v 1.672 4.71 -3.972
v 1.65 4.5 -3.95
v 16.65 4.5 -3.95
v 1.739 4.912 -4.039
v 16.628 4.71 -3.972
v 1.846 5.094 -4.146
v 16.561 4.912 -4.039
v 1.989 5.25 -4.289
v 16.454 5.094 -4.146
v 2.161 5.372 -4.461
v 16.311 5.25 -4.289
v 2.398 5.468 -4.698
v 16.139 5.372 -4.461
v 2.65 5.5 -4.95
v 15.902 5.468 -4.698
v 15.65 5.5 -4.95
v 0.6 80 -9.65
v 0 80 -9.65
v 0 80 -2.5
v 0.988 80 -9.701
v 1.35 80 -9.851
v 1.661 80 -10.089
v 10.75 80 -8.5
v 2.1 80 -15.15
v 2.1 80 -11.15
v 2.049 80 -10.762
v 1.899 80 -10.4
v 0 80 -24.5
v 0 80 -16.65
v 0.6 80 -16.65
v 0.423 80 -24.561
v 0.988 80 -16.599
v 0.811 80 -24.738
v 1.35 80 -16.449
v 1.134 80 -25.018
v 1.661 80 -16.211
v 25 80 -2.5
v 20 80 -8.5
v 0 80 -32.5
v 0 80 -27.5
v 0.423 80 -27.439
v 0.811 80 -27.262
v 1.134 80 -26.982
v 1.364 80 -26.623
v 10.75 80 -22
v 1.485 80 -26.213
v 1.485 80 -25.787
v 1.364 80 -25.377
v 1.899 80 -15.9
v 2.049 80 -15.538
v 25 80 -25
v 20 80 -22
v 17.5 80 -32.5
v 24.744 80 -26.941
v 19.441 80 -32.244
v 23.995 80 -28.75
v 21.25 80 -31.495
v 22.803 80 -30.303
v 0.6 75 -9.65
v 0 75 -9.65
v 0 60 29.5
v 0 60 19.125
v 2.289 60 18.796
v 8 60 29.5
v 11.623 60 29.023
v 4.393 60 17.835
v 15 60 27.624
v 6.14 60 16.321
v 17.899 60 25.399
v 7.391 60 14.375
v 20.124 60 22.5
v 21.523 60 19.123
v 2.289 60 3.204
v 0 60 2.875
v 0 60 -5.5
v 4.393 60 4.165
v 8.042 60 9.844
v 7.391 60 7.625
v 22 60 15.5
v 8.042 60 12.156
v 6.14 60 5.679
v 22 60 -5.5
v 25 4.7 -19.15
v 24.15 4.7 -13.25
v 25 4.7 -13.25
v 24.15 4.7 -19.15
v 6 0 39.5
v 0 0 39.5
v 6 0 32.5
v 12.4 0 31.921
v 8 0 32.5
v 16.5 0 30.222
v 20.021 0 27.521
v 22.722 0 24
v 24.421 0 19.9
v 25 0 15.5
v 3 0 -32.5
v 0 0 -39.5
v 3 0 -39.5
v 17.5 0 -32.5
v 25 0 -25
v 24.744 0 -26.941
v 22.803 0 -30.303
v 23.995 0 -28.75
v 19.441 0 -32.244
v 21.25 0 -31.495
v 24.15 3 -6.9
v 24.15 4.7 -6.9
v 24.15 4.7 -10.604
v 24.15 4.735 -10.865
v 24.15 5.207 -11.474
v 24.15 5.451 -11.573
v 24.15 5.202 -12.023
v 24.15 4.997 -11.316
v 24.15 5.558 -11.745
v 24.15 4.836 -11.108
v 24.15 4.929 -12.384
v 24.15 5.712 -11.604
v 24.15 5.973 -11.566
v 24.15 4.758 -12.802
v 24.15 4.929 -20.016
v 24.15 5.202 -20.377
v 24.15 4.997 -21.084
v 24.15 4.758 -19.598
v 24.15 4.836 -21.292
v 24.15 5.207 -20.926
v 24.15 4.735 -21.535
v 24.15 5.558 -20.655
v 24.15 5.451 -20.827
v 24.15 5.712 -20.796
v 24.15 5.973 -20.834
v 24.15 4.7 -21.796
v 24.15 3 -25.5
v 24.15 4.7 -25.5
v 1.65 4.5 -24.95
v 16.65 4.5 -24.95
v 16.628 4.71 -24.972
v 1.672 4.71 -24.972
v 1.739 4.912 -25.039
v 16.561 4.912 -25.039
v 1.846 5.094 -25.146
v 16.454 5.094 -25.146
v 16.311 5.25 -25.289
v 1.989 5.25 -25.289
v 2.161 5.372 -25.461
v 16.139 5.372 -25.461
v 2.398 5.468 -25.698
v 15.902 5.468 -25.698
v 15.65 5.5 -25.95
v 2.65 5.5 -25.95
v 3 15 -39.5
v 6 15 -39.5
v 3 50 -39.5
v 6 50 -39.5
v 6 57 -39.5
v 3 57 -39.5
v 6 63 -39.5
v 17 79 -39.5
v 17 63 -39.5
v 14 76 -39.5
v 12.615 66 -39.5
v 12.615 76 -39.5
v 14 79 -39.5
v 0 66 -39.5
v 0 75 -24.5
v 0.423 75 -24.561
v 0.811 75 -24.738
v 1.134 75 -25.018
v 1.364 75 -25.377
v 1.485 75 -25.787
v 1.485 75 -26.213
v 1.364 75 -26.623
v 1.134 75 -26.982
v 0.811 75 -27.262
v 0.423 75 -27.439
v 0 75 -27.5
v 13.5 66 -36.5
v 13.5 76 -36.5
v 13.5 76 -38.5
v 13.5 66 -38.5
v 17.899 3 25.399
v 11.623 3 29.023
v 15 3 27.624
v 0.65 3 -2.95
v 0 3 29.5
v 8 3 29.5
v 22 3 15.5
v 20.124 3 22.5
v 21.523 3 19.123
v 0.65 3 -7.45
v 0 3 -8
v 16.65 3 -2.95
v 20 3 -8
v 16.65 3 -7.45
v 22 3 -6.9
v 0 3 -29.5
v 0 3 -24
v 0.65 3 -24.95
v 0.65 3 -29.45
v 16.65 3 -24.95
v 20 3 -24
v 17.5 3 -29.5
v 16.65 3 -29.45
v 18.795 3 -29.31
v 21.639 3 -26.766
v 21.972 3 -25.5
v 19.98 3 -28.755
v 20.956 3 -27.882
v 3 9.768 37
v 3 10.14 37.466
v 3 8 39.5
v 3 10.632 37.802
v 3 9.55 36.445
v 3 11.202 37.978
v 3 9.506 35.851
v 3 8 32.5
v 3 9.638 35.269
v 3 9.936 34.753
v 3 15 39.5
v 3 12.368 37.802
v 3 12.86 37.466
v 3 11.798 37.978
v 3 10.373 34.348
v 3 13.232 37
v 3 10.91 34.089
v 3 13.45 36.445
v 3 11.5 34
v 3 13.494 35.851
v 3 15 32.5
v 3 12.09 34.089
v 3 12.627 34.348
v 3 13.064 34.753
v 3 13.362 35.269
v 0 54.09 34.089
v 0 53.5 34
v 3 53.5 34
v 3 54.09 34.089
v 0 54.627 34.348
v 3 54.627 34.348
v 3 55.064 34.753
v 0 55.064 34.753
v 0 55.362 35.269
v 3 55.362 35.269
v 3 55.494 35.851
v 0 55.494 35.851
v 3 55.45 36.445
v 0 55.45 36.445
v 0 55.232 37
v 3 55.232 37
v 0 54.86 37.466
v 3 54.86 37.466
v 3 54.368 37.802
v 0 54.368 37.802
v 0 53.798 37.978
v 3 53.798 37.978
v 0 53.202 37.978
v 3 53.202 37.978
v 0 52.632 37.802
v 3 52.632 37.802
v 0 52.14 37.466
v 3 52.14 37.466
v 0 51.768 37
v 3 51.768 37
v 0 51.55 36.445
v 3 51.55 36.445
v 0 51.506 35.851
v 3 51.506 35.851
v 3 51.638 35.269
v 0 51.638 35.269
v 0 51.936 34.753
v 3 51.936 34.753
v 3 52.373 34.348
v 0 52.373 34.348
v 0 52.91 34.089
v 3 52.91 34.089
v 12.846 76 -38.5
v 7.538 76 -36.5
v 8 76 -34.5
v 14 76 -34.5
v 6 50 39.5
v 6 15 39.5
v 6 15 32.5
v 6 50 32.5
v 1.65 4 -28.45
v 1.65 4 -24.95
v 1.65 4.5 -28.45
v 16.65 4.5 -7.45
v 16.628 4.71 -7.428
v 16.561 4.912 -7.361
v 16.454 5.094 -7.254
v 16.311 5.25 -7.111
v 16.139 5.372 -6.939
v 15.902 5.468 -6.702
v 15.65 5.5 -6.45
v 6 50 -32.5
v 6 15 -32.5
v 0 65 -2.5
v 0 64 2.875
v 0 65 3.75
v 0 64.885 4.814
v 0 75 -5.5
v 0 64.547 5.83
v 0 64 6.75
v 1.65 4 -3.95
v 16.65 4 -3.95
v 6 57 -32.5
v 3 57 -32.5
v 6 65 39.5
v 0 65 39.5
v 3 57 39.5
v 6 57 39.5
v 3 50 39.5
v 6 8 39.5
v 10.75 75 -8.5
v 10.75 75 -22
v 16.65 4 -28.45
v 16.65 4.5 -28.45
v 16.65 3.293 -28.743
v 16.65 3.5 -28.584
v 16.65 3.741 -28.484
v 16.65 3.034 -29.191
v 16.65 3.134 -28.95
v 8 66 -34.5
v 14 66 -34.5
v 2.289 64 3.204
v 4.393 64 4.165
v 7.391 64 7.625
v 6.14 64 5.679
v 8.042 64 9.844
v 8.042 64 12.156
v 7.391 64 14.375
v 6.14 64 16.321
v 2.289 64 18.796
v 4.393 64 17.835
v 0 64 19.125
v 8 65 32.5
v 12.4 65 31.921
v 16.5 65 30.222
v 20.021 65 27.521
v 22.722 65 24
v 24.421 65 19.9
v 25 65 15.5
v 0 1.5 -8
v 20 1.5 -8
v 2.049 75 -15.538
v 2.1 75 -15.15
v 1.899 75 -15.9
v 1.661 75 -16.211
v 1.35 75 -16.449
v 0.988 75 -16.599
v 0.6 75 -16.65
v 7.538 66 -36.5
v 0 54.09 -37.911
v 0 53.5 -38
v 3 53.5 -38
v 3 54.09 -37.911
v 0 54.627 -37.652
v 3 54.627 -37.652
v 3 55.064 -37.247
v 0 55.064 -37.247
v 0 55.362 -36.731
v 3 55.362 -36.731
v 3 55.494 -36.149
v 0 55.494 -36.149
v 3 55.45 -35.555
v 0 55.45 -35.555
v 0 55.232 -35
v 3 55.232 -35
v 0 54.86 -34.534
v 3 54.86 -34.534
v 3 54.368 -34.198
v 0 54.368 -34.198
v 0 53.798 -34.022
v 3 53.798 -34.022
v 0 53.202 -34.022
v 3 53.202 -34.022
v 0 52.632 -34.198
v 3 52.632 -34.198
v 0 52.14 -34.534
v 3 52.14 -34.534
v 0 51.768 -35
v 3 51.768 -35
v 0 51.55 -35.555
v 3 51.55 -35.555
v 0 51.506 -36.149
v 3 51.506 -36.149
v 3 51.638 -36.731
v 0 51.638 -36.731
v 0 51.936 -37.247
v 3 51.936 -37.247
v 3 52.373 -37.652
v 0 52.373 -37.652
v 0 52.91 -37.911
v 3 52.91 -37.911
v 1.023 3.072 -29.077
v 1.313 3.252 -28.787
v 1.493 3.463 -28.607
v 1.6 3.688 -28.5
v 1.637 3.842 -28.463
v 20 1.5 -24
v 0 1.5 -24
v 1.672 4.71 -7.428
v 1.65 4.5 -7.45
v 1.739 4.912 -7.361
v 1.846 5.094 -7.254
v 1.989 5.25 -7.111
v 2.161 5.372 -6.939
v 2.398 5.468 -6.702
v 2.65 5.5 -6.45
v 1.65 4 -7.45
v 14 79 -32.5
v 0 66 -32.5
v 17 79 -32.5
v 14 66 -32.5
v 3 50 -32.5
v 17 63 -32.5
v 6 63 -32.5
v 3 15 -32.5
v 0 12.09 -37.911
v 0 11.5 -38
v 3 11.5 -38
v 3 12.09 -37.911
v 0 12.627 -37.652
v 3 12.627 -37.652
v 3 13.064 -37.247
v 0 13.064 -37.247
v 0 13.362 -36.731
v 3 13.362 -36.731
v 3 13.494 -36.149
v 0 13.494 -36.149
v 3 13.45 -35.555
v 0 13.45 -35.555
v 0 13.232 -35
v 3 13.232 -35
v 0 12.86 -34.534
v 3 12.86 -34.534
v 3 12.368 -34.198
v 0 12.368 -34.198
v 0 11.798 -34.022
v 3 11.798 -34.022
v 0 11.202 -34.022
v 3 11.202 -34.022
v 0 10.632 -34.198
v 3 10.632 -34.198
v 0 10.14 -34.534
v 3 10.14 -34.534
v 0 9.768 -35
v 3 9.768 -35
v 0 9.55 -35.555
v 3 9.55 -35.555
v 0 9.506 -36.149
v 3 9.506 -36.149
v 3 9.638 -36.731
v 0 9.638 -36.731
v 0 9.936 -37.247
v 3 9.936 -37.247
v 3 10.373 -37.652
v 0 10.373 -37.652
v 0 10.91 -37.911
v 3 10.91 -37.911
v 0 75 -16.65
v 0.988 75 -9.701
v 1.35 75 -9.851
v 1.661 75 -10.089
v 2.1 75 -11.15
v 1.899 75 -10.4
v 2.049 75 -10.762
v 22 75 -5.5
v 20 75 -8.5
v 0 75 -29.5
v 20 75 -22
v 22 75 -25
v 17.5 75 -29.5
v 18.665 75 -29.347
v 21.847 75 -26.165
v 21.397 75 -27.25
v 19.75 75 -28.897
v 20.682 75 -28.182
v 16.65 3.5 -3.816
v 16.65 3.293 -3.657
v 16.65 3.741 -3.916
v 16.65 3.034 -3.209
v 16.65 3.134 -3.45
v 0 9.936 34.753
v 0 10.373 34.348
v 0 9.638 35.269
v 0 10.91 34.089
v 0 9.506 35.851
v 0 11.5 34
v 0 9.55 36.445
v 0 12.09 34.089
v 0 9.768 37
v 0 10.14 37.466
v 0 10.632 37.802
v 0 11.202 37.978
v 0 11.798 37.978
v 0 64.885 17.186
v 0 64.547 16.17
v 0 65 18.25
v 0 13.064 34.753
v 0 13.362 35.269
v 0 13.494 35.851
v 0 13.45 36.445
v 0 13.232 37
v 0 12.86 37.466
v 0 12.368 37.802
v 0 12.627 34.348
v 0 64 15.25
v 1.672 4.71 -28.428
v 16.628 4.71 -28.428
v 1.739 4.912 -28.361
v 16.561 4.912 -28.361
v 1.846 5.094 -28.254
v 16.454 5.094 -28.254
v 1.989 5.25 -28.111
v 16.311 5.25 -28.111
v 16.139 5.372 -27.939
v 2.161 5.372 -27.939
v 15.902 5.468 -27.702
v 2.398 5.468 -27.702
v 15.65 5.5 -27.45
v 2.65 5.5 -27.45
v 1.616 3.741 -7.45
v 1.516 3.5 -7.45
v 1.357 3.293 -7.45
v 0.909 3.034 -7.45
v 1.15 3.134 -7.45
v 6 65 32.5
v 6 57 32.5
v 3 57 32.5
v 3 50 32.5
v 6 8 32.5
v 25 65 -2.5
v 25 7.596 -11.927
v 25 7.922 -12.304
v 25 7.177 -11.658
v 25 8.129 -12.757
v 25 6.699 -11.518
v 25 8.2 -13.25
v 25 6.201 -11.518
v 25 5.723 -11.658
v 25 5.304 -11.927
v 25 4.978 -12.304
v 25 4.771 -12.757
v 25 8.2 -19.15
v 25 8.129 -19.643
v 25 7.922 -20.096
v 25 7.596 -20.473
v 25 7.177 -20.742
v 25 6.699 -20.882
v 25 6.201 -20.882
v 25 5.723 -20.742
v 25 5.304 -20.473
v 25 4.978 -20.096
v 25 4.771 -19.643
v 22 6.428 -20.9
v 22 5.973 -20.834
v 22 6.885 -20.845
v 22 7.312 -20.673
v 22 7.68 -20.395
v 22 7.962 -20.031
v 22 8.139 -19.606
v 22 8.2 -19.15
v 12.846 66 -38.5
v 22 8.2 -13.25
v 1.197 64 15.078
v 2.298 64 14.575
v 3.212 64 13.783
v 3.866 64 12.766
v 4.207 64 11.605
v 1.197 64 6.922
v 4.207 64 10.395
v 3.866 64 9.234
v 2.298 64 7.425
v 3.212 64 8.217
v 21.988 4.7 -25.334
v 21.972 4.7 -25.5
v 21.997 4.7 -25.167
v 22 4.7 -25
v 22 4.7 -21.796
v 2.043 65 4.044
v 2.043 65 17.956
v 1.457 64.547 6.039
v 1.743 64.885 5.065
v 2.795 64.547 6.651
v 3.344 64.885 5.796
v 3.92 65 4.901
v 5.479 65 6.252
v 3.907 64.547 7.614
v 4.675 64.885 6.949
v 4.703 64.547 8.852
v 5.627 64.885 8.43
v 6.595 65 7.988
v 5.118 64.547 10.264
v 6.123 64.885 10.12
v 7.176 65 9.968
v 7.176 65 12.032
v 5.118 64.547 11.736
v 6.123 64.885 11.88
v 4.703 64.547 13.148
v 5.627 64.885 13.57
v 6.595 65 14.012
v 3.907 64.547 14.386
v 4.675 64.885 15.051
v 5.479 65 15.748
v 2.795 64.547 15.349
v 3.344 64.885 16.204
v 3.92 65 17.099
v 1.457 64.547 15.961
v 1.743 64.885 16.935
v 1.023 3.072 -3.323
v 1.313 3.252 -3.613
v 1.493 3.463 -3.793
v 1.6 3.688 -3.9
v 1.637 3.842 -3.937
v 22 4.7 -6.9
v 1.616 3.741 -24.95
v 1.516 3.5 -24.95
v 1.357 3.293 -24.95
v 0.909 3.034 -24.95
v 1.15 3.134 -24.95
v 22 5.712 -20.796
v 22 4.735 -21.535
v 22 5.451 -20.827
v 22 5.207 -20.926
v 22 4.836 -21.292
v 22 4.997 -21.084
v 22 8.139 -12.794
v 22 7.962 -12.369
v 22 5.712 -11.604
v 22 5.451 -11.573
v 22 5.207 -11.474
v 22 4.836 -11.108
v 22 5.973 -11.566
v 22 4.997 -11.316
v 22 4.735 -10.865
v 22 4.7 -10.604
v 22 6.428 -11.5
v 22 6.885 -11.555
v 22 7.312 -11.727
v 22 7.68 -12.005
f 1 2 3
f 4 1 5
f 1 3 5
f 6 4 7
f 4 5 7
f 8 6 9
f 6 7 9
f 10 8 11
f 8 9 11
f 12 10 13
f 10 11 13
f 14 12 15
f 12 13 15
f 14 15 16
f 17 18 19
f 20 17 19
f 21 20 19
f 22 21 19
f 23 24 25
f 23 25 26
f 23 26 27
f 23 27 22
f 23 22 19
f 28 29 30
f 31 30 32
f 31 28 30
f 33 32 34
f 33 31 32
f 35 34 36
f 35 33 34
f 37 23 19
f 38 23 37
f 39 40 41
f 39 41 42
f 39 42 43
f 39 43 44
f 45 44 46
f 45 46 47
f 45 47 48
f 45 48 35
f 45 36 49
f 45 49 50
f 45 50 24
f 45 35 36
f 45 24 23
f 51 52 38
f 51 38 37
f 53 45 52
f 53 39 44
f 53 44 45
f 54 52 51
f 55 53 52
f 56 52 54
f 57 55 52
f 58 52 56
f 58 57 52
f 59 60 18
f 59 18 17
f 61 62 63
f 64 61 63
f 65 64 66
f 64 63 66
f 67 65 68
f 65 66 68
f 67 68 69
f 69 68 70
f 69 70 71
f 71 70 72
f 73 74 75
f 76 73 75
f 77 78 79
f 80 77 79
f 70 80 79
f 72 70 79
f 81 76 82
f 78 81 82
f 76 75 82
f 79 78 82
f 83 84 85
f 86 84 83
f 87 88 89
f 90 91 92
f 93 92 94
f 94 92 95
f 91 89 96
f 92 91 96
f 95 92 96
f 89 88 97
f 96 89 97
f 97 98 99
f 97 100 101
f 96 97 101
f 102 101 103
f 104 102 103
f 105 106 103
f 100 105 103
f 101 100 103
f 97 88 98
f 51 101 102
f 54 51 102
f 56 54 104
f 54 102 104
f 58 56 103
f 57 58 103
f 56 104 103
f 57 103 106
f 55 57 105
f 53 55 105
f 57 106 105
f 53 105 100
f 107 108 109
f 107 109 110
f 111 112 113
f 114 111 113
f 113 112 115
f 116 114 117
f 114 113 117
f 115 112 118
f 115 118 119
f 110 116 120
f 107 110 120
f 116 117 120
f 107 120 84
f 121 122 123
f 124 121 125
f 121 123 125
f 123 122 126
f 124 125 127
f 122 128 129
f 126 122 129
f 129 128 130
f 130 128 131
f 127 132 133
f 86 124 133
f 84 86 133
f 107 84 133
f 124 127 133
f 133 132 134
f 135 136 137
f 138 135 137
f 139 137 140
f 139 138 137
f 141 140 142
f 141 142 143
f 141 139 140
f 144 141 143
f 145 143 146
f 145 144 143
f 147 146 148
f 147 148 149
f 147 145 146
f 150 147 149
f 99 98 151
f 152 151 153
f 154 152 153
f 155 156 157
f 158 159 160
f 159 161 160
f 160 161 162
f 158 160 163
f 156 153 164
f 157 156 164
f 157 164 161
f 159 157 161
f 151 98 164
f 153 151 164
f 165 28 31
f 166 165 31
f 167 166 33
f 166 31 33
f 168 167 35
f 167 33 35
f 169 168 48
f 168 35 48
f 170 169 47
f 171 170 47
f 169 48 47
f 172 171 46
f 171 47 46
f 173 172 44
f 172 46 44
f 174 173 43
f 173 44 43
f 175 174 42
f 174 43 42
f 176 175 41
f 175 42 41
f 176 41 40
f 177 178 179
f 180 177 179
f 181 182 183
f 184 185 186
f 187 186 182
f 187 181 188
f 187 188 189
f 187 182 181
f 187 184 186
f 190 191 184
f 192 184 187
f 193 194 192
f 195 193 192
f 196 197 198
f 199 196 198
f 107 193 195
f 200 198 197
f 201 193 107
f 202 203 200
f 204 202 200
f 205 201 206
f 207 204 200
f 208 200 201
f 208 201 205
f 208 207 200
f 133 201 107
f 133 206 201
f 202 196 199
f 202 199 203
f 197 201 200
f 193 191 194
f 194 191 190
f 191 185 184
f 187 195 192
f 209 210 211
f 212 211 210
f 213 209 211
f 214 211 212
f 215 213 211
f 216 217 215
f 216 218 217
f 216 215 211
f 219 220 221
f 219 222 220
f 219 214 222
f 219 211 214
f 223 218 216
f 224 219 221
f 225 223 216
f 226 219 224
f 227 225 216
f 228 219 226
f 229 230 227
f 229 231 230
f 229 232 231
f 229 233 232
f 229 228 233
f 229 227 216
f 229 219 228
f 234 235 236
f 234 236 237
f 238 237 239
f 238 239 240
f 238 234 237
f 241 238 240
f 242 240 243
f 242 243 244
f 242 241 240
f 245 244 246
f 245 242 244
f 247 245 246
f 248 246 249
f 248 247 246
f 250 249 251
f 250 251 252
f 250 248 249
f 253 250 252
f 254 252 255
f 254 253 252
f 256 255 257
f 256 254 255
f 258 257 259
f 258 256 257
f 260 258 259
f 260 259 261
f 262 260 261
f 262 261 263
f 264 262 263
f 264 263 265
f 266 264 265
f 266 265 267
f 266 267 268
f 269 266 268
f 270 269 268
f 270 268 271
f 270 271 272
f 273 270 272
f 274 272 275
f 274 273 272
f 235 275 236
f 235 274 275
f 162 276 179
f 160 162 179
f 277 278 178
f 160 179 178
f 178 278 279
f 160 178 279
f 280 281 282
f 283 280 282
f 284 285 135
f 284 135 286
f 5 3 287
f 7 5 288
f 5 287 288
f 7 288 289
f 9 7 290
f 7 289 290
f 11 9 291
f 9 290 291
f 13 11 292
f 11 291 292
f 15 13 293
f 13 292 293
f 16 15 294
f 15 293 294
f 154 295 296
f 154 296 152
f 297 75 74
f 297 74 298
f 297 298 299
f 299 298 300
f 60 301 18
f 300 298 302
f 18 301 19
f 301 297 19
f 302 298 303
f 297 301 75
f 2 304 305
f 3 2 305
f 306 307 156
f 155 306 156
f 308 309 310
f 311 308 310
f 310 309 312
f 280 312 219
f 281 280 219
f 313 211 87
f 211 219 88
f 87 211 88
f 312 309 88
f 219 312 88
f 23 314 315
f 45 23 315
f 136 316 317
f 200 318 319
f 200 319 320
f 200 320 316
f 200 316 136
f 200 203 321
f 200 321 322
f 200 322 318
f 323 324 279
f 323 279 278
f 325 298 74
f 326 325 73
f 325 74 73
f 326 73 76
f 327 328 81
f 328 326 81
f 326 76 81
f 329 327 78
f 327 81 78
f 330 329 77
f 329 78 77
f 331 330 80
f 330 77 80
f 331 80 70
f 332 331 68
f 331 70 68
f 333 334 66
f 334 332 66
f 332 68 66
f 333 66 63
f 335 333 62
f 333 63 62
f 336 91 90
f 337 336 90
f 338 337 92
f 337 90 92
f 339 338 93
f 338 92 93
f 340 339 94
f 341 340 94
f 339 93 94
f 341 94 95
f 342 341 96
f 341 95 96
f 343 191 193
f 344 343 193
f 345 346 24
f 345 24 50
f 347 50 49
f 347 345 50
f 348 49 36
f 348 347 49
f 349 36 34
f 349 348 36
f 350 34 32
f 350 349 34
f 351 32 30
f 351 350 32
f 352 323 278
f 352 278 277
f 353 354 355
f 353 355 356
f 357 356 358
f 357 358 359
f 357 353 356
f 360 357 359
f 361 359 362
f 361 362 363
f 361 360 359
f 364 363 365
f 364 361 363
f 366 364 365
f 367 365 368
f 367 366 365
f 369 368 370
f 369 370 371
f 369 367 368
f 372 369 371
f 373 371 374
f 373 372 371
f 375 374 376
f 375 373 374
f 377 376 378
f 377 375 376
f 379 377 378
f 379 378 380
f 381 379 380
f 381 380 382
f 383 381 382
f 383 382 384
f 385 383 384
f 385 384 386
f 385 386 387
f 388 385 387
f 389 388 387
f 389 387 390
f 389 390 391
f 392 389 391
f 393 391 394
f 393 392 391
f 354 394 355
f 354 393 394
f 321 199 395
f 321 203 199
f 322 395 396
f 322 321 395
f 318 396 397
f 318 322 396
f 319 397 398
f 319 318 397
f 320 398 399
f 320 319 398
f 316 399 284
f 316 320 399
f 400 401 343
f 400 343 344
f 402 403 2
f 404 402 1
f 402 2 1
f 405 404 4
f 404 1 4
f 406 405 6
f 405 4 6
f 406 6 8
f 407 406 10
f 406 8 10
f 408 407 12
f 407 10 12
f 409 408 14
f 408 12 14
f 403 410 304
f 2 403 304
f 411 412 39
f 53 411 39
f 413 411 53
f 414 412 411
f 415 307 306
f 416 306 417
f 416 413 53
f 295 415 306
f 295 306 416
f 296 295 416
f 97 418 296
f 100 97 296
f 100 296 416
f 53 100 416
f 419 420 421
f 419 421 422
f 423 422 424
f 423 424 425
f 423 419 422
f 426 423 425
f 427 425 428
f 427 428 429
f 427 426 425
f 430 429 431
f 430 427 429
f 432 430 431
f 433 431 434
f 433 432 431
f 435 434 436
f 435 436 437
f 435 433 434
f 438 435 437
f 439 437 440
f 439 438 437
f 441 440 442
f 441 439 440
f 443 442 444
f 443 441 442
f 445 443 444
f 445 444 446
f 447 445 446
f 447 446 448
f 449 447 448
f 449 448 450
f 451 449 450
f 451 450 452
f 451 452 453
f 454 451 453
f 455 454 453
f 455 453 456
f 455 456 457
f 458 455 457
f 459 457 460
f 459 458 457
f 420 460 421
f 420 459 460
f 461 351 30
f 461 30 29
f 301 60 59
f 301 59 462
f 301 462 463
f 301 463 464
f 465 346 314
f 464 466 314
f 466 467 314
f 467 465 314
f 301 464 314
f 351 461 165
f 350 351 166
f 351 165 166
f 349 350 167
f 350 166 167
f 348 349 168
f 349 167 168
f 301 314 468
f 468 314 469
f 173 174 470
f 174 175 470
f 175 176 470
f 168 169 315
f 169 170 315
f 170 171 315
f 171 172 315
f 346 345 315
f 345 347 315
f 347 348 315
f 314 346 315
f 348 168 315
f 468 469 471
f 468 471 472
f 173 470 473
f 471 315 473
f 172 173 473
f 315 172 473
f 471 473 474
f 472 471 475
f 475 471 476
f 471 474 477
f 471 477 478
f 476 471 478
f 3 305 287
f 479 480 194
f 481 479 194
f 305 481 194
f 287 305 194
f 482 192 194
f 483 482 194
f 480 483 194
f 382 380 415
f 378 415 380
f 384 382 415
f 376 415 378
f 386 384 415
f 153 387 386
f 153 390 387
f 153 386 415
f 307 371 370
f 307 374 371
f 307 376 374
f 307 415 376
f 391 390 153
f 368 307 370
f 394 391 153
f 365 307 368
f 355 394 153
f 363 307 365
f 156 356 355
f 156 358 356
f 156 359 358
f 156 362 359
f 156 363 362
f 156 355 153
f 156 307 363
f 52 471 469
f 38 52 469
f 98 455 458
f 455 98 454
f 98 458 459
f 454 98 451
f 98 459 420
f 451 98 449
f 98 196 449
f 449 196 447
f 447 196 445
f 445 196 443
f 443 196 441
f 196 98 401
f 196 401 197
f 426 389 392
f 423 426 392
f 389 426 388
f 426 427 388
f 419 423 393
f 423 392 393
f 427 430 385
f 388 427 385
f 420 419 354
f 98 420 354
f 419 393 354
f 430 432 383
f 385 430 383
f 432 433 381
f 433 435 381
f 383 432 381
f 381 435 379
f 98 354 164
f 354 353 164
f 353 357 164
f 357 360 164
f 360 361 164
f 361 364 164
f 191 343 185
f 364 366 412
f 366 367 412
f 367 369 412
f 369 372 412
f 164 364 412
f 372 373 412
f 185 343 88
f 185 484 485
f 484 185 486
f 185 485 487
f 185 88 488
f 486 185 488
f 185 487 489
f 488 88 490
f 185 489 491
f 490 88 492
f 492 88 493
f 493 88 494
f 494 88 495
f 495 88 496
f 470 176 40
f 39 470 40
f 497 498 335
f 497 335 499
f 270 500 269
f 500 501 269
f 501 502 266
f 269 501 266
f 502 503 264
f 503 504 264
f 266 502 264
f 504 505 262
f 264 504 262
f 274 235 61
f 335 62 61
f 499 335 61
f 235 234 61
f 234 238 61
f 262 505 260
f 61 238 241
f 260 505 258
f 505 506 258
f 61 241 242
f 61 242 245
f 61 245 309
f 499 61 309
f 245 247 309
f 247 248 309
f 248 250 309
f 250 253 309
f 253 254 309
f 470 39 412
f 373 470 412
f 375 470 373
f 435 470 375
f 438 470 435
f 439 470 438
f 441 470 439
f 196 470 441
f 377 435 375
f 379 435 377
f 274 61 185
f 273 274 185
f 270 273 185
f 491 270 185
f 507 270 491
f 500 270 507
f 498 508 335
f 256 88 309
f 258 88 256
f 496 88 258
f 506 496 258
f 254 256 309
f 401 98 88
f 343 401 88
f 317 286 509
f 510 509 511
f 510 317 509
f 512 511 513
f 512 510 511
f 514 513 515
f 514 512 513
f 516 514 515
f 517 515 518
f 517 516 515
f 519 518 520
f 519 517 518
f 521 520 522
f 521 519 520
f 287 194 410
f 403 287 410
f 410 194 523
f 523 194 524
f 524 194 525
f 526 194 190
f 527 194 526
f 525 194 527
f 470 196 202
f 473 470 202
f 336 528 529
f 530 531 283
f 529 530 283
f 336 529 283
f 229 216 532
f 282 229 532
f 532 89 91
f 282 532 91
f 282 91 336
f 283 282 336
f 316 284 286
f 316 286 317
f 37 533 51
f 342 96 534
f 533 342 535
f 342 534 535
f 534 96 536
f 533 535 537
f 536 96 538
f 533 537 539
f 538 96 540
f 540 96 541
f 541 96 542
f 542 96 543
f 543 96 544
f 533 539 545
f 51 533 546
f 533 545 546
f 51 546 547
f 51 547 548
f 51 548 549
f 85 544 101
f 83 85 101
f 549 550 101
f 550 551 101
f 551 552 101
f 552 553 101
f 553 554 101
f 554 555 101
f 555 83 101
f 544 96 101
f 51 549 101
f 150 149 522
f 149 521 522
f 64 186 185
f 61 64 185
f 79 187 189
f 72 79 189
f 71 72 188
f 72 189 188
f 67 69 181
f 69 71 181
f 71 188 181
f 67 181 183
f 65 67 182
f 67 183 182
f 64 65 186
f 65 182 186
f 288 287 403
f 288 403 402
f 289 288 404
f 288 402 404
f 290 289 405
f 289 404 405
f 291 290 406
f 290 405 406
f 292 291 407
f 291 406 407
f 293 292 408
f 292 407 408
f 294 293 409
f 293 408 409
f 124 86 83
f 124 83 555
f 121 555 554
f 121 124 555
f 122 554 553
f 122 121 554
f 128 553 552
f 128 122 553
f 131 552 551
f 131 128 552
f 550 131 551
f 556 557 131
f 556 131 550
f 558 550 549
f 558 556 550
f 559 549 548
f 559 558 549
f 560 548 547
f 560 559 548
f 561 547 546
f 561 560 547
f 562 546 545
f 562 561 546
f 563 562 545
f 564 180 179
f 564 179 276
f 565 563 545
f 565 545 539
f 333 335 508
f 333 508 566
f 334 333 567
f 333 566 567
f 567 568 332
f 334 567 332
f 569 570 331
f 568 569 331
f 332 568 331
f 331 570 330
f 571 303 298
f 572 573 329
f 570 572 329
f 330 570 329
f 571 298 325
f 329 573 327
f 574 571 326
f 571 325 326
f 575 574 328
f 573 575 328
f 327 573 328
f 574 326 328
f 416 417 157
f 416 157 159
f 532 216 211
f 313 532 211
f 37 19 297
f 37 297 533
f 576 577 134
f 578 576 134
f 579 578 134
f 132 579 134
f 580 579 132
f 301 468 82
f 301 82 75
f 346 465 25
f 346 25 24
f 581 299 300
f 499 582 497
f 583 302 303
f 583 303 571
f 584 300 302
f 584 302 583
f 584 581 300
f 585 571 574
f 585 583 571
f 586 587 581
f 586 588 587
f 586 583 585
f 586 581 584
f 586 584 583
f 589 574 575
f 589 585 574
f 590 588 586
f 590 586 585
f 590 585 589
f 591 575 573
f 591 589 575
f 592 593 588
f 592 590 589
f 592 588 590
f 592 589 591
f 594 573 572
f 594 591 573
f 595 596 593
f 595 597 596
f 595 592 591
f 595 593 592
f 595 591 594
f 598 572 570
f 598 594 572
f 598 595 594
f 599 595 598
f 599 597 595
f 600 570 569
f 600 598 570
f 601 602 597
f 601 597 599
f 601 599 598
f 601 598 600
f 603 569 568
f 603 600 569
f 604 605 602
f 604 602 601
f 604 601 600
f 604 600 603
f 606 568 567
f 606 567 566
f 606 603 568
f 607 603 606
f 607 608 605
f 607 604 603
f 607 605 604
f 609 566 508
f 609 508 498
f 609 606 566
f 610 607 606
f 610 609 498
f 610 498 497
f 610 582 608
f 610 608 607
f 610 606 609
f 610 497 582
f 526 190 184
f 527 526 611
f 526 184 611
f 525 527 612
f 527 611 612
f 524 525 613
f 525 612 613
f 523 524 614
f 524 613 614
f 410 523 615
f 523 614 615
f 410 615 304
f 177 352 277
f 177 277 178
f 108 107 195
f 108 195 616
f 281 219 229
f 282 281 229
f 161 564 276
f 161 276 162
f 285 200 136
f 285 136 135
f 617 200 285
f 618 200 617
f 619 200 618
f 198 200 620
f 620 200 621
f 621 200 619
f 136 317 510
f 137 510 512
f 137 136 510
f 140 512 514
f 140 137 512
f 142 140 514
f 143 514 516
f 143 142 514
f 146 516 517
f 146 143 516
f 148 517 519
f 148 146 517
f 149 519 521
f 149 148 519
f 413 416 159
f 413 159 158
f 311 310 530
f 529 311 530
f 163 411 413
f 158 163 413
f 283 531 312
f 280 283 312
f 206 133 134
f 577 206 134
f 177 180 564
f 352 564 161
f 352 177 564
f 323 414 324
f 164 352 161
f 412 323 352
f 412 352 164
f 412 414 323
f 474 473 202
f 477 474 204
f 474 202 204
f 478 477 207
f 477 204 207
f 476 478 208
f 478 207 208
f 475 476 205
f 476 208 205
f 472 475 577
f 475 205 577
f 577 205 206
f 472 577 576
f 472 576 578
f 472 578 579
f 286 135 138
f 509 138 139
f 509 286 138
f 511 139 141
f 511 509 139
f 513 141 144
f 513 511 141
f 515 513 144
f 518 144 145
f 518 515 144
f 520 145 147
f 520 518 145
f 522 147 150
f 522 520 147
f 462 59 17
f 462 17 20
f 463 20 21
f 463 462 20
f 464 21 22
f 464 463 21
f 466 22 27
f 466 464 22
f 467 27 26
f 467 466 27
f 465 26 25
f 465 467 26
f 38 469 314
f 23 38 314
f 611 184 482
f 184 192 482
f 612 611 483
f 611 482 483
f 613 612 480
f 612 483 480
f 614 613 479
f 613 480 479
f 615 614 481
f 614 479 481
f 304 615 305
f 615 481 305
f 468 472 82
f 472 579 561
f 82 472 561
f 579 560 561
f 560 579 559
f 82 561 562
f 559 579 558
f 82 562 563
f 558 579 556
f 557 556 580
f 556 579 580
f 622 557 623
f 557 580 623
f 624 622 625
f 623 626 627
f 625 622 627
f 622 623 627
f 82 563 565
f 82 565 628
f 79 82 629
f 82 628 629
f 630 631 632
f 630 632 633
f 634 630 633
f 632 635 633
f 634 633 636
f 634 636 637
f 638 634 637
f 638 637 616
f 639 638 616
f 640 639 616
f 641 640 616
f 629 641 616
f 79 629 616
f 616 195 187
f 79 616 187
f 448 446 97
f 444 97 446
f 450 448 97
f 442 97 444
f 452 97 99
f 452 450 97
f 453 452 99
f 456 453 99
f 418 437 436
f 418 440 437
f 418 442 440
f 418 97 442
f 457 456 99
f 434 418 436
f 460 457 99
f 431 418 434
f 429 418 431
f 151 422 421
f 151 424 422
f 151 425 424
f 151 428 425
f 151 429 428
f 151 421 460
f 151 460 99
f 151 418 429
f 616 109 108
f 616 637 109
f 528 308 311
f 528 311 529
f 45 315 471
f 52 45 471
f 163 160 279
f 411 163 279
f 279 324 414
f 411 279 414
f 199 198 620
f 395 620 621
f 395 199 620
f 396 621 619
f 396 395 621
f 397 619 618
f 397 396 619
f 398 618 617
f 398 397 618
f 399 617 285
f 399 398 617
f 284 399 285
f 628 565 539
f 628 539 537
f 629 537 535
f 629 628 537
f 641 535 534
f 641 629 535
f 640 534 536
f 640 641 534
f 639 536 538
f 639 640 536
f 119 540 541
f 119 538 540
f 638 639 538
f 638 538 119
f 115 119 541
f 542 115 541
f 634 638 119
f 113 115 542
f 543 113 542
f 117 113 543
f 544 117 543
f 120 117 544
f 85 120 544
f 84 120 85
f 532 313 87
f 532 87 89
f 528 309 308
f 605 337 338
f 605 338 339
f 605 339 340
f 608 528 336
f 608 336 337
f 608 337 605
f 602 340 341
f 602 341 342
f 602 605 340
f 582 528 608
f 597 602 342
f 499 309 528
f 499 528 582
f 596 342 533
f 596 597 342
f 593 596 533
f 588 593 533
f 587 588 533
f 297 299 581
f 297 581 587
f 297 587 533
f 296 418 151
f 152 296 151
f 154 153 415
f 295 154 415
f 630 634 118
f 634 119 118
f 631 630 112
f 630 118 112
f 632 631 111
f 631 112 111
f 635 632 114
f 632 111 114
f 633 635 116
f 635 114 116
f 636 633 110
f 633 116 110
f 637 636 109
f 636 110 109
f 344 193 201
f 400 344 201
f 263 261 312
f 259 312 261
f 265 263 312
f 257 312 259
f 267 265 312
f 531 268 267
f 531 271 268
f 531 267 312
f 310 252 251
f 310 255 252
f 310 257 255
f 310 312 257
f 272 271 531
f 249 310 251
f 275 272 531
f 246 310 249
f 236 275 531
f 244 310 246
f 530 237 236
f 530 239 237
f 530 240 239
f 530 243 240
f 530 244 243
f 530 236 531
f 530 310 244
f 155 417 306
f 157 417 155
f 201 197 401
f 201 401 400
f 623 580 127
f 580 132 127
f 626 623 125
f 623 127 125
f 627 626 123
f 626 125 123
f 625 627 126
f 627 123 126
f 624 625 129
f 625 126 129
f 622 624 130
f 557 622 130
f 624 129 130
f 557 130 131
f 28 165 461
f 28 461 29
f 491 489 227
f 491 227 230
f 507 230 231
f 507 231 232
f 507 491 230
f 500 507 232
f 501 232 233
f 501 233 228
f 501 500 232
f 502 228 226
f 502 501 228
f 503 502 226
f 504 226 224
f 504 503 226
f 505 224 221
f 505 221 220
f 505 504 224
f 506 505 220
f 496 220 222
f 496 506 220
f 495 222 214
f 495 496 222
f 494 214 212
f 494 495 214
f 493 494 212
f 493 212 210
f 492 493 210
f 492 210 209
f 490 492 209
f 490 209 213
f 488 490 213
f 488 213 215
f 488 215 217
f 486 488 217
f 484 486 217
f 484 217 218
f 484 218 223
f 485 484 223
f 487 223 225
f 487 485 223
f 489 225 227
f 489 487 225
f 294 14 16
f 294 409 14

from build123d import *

# Parameters (mm, degrees)
FLOOR_2_DEPTH           = 3
WALLS_DEPTH             = 65
WALLS2_DEPTH            = 80
CEILING_START           = 60
CEILING_DEPTH           = 5
CEILING2_START          = 75
CEILING2_DEPTH          = 5
SALIENTE_EXTRUIR3_START = 80
SALIENTE_EXTRUIR3_DEPTH = 20
COVER_START             = 64
COVER_DEPTH             = 1
CROQUIS8_W              = 7
CROQUIS8_H              = 7.999999999999993
UNION_DEPTH             = 6
CROQUIS8_3_R            = 2.0000000000000036
CROQUIS8_3_R_2          = 2.0000000000000027
UNION_2_DEPTH           = 3
CONECTOR_START          = -32.5
CROQUIS9_W              = 17
CROQUIS9_H              = 15.999999999999993
CONECTOR_DEPTH          = 7
CONECTOR2_START         = -3
CONECTOR2_DEPTH         = 10
SWICHT_ESP_START        = 75
SWICHT_ESP_DEPTH        = 18.656624156074244
CORTAR_EXTRUIR2_DEPTH   = 93.65662415607424
CORTAR_EXTRUIR3_DEPTH   = 24.15
SALIENTE_EXTRUIR4_START = 3
SALIENTE_EXTRUIR4_DEPTH = 2.5
REDONDEO1_R             = 1
CROQUIS21_W             = 14.000000000000002
CROQUIS21_H             = 6.999999999999993
CORTAR_EXTRUIR5_DEPTH   = 90.22583706528059
REDONDEO2_R             = 5
CORTAR_EXTRUIR6_REACH   = 94.657
CROQUIS22_R             = 1.5000000000000018
REDONDEO3_R             = 1
CROQUIS18_W             = 20
CROQUIS18_H             = 16
CORTAR_EXTRUIR7_DEPTH   = 1.5


# Read off the part's stored shape, not the designer's step: Walls2
with BuildPart() as part:
    # Croquis3 → Floor 2 (new body)
    with BuildSketch(Plane(origin=(0, 0, 0), x_dir=(1, 0, 0), z_dir=(0, 1, 0))):
        with BuildLine():
            Line((17.5, 29.500000000000004), (0, 29.500000000000004))
            Line((0, 29.500000000000004), (7.41e-15, -29.500000000000004))
            Line((7.41e-15, -29.500000000000004), (8.000000000000002, -29.500000000000004))
            ThreePointArc((8.000000000000002, -29.500000000000007), (17.89949493661167, -25.399494936611667), (22.000000000000007, -15.499999999999998))
            Line((22.000000000000007, -15.5), (22.000000000000004, 25))
            ThreePointArc((22.000000000000004, 25), (20.681980515339465, 28.181980515339465), (17.5, 29.500000000000004))
        make_face()
    extrude(amount=FLOOR_2_DEPTH)

    # Croquis3<3> → Walls (add)
    with BuildSketch(Plane(origin=(0, 0, 0), x_dir=(1, 0, 0), z_dir=(0, 1, 0))):
        with BuildLine():
            Line((25.000000000000004, 5.5), (22.000000000000007, 5.5))
            Line((22.00000000000001, 5.5), (22.000000000000007, -15.5))
            ThreePointArc((22.000000000000007, -15.499999999999998), (17.89949493661167, -25.399494936611667), (8.000000000000002, -29.500000000000007))
            Line((8.000000000000002, -29.500000000000004), (7.41e-15, -29.500000000000004))
            Line((7.07e-15, -29.5), (7.41e-15, -32.5))
            Line((7.41e-15, -32.5), (8.000000000000005, -32.5))
            ThreePointArc((8.000000000000005, -32.5), (20.020815280171313, -27.520815280171306), (25, -15.499999999999998))
            Line((25, -15.499999999999998), (25.000000000000004, 5.500000000000002))
        make_face()
    extrude(amount=WALLS_DEPTH)

    # Walls2 outline → Walls2 (add)
    with BuildSketch(Plane(origin=(0, 0, 0), x_dir=(1, 0, 0), z_dir=(0, 1, 0))):
        with BuildLine():
            Line((0, 32.5), (0, 29.5))
            Line((0, 29.5), (17.5, 29.5))
            ThreePointArc((17.5, 29.5), (20.681980515, 28.181980515), (22, 25))
            Line((22, 25), (22, 2.5))
            Line((22, 2.5), (25, 2.5))
            Line((25, 2.5), (25, 25))
            ThreePointArc((25, 25), (22.803300859, 30.303300859), (17.5, 32.5))
            Line((17.5, 32.5), (0, 32.5))
        make_face()
    extrude(amount=WALLS2_DEPTH)

    # Croquis3<4> → Ceiling (add)
    with BuildSketch(Plane(origin=(0, 0, 0), x_dir=(1, 0, 0), z_dir=(0, 1, 0)).offset(CEILING_START)):
        with BuildLine():
            Line((22.000000000000007, 2.500000000000002), (3.55e-15, 2.4999999999999996))
            Line((3.42e-15, 2.5), (4.03e-15, -2.875000000000014))
            ThreePointArc((5.66e-15, -2.8750000000000107), (8.124999999999995, -11.00000000000001), (6.32e-15, -19.12500000000001))
            Line((5.89e-15, -19.125000000000014), (7.07e-15, -29.5))
            Line((7.41e-15, -29.500000000000004), (8.000000000000002, -29.500000000000004))
            ThreePointArc((8.000000000000002, -29.500000000000007), (17.89949493661167, -25.399494936611667), (22.000000000000007, -15.499999999999998))
            Line((22.000000000000007, -15.5), (22.000000000000007, 2.5000000000000036))
        make_face()
    extrude(amount=CEILING_DEPTH)

    # Croquis3<7> → Ceiling2 (add)
    with BuildSketch(Plane(origin=(0, 0, 0), x_dir=(1, 0, 0), z_dir=(0, 1, 0)).offset(CEILING2_START)):
        with BuildLine():
            Line((17.5, 29.500000000000004), (0, 29.500000000000004))
            Line((3.4e-16, 29.500000000000004), (3.08e-15, 5.5))
            Line((3.31e-15, 5.5), (22.000000000000007, 5.5))
            Line((22.000000000000004, 5.5), (22.000000000000004, 25))
            ThreePointArc((22.000000000000004, 25), (20.681980515339465, 28.181980515339465), (17.5, 29.500000000000004))
        make_face()
    extrude(amount=CEILING2_DEPTH)

    # Croquis3<8> → Saliente-Extruir3 (add)
    with BuildSketch(Plane(origin=(0, 0, 0), x_dir=(1, 0, 0), z_dir=(0, 1, 0)).offset(SALIENTE_EXTRUIR3_START)):
        Polygon((22.000000000000007, 5.5), (3.31e-15, 5.5), (3.42e-15, 2.5), (22.000000000000007, 2.500000000000002), align=None)
    extrude(amount=-SALIENTE_EXTRUIR3_DEPTH)

    # Croquis3<5> → Cover (add)
    with BuildSketch(Plane(origin=(0, 0, 0), x_dir=(1, 0, 0), z_dir=(0, 1, 0)).offset(COVER_START)):
        with BuildLine():
            ThreePointArc((6.32e-15, -19.12500000000001), (8.124999999999995, -11.00000000000001), (5.66e-15, -2.8750000000000107))
            Line((4.03e-15, -2.875000000000014), (4.48e-15, -6.750000000000014))
            ThreePointArc((5.44e-15, -6.750000000000012), (4.2499999999999964, -11.000000000000012), (5.85e-15, -15.250000000000012))
            Line((5.45e-15, -15.250000000000014), (5.89e-15, -19.125000000000014))
        make_face()
    extrude(amount=COVER_DEPTH)

    # Croquis8 → Union (add)
    with BuildSketch(Plane(origin=(0, 0, 0), x_dir=(0, 0, -1), z_dir=(1, 0, 0))):
        with Locations((-36, 61)):
            Rectangle(CROQUIS8_W, CROQUIS8_H)
        Polygon((-32.5, 15), (-32.5, 50), (-39.499999999999986, 50), (-39.49999999999999, 15), align=None)
        Polygon((-32.5, 0), (-32.5, 8), (-39.5, 8.000000000000002), (-39.49999999999999, 0), align=None)
        Polygon((39.5, 80), (32.5, 80), (32.5, 57.000000000000036), (39.49999999999999, 57.000000000000036), align=None)
        Polygon((39.49999999999999, 50.000000000000036), (32.500000000000014, 50.00000000000003), (32.5, 15), (39.49999999999999, 15), align=None)
    extrude(amount=UNION_DEPTH)

    # Croquis8<3> → Union_2 (add)
    # profile 1 of 4: a face of its own
    with BuildSketch(Plane(origin=(0, 0, 0), x_dir=(0, 0, -1), z_dir=(1, 0, 0))):
        Polygon((-32.5, 50), (-32.5, 57), (-39.49999999999998, 57), (-39.5, 50), align=None)
        with Locations((-35.99999999999999, 53.50000000000001)):
            Circle(CROQUIS8_3_R, mode=Mode.SUBTRACT)
    # profile 2 of 4: a face of its own
    with BuildSketch(Plane(origin=(0, 0, 0), x_dir=(0, 0, -1), z_dir=(1, 0, 0))):
        Polygon((-32.5, 8), (-32.5, 15), (-39.5, 15), (-39.49999999999999, 8), align=None)
        with Locations((-36.00000000000001, 11.5)):
            Circle(CROQUIS8_3_R_2, mode=Mode.SUBTRACT)
    # profile 3 of 4: a face of its own
    with BuildSketch(Plane(origin=(0, 0, 0), x_dir=(0, 0, -1), z_dir=(1, 0, 0))):
        Polygon((39.49999999999999, 15), (32.500000000000014, 15), (32.5, 0), (39.50000000000001, 0), align=None)
        with Locations((36.00000000000001, 11.5)):
            Circle(CROQUIS8_3_R_2, mode=Mode.SUBTRACT)
    # profile 4 of 4: a face of its own
    with BuildSketch(Plane(origin=(0, 0, 0), x_dir=(0, 0, -1), z_dir=(1, 0, 0))):
        Polygon((39.49999999999999, 57.000000000000036), (32.500000000000014, 57.000000000000036), (32.5, 50.00000000000003), (39.49999999999999, 50.000000000000036), align=None)
        with Locations((36.00000000000001, 53.500000000000036)):
            Circle(CROQUIS8_3_R, mode=Mode.SUBTRACT)
    extrude(amount=UNION_2_DEPTH)

    # Croquis9 → Conector (add)
    with BuildSketch(Plane.XY.offset(CONECTOR_START)):
        with Locations((8.5, 71)):
            Rectangle(CROQUIS9_W, CROQUIS9_H)
    extrude(amount=-CONECTOR_DEPTH)

    # Croquis12 → Conector2 (cut)
    with BuildSketch(Plane.XZ.offset(-63).offset(CONECTOR2_START)):
        Polygon((0, -32.50000000000001), (14, -32.50000000000001), (13.999999999999996, -34.50000000000001), (7.9999999999999964, -34.500000000000014), (7.538263617748875, -36.50000000000003), (13.499999999999998, -36.50000000000003), (13.499999999999998, -38.50000000000003), (12.845659041125556, -38.50000000000003), (12.61479085, -39.50000000000001), (0, -39.50000000000001), align=None)
    extrude(amount=-CONECTOR2_DEPTH, mode=Mode.SUBTRACT)

    # Croquis13 → Swicht-Esp (cut, through all)
    with BuildSketch(Plane(origin=(0, 0, 0), x_dir=(1, 0, 0), z_dir=(0, 1, 0)).offset(SWICHT_ESP_START)):
        with BuildLine():
            Line((-11.399999999999999, 9.650000000000002), (0.6000000000000015, 9.650000000000002))
            ThreePointArc((0.6000000000000015, 9.650000000000002), (1.6606601717798224, 10.089339828220183), (2.100000000000001, 11.150000000000004))
            Line((2.100000000000001, 11.150000000000004), (2.100000000000001, 15.150000000000004))
            ThreePointArc((2.100000000000001, 15.150000000000004), (1.6606601717798242, 16.210660171779825), (0.6000000000000015, 16.650000000000006))
            Line((0.6000000000000015, 16.650000000000006), (-11.399999999999999, 16.650000000000006))
            ThreePointArc((-11.399999999999999, 16.650000000000006), (-12.46066017177982, 16.210660171779825), (-12.899999999999999, 15.150000000000004))
            Line((-12.899999999999999, 15.150000000000004), (-12.899999999999999, 11.150000000000004))
            ThreePointArc((-12.899999999999999, 11.150000000000004), (-12.460660171779821, 10.089339828220181), (-11.399999999999999, 9.650000000000002))
        make_face()
        Polygon((20, 8.500000000000002), (10.75, 8.5), (10.75, 22.000000000000004), (20, 22.000000000000004), align=None)
    extrude(amount=SWICHT_ESP_DEPTH, mode=Mode.SUBTRACT)

    # Croquis19 → Cortar-Extruir2 (cut, through all)
    with BuildSketch(Plane(origin=(0, 0, 0), x_dir=(0, 0, -1), z_dir=(1, 0, 0))):
        with BuildLine():
            Line((13.250000000000005, 4.700000000000003), (19.150000000000006, 4.700000000000003))
            ThreePointArc((19.150000000000006, 4.700000000000003), (20.90000000000001, 6.450000000000006), (19.150000000000006, 8.20000000000001))
            Line((19.150000000000006, 8.20000000000001), (13.250000000000005, 8.20000000000001))
            ThreePointArc((13.250000000000005, 8.20000000000001), (11.500000000000002, 6.450000000000006), (13.250000000000005, 4.700000000000003))
        make_face()
    extrude(amount=CORTAR_EXTRUIR2_DEPTH, mode=Mode.SUBTRACT)

    # Croquis19<3> → Cortar-Extruir3 (cut)
    with BuildSketch(Plane(origin=(0, 0, 0), x_dir=(0, 0, -1), z_dir=(1, 0, 0))):
        Polygon((19.150000000000006, 4.700000000000003), (13.250000000000005, 4.700000000000003), (7.400000000000011, 4.700000000000003), (7.400000000000011, 3.0000000000000027), (25, 3.0000000000000027), (25, 4.700000000000003), align=None)
        Polygon((25, 3.0000000000000027), (25.500000000000004, 3.0000000000000053), (25.500000000000004, 4.700000000000003), (25, 4.700000000000003), align=None)
        Polygon((6.90000000000001, 3.0000000000000053), (6.90000000000001, 4.700000000000003), (7.400000000000011, 4.700000000000003), (7.400000000000011, 3.0000000000000027), align=None)
    extrude(amount=CORTAR_EXTRUIR3_DEPTH, mode=Mode.SUBTRACT)

    # Croquis20 → Saliente-Extruir4 (add)
    with BuildSketch(Plane(origin=(0, 0, 0), x_dir=(1, 0, 0), z_dir=(0, 1, 0)).offset(SALIENTE_EXTRUIR4_START)):
        Polygon((1.6500000000000026, 3.9500000000000064), (16.650000000000006, 3.950000000000008), (16.650000000000006, 7.450000000000009), (1.6500000000000026, 7.450000000000006), align=None)
        Polygon((1.6499999999999995, 28.450000000000003), (16.650000000000002, 28.450000000000003), (16.650000000000002, 24.950000000000003), (1.6500000000000004, 24.950000000000003), align=None)
    extrude(amount=SALIENTE_EXTRUIR4_DEPTH)

    # Redondeo1
    redondeo1_edges = [part.edges().sort_by_distance(p)[0] for p in [
        (1.6500000000000026, 3, -5.700000000000006),
        (9.150000000000004, 5.5, -3.9500000000000073),
        (16.650000000000006, 5.5, -5.700000000000008),
        (1.6500000000000026, 5.5, -5.700000000000006),
        (9.150000000000004, 5.5, -7.450000000000008),
        (9.150000000000004, 3, -3.9500000000000073),
        (9.150000000000002, 5.5, -24.950000000000003),
        (9.150000000000002, 3, -28.450000000000003),
        (1.65, 5.5, -26.700000000000003),
        (16.650000000000002, 5.5, -26.700000000000003),
        (9.150000000000002, 5.5, -28.450000000000003),
        (1.65, 3, -26.700000000000003),
    ]]
    fillet(redondeo1_edges, radius=REDONDEO1_R)

    # Croquis21 → Cortar-Extruir5 (cut, through all)
    with BuildSketch(Plane.XZ.offset(-76)):
        with Locations((7.000000000000001, -36)):
            Rectangle(CROQUIS21_W, CROQUIS21_H)
    extrude(amount=-CORTAR_EXTRUIR5_DEPTH, mode=Mode.SUBTRACT)

    # Redondeo2
    # the kernel refuses this fillet: 5 mm, written as the material it takes off along each edge
    with BuildSketch(Plane(origin=(-3.77e-15, 65, 11.000000000000012), x_dir=(-0.9999950652018581, 0, -0.0031415874858800956), z_dir=(-0.0031415874858800956, 0, 0.9999950652018581))) as redondeo2_piece_1:
        with BuildLine():
            CenterArc((7.250000000000317, 4.999999999999999), REDONDEO2_R, 233.13010235415305, 36.86989764584695)
            Line((4.250000000000113, 1.000000000000149), (4.190000000000109, 0.9200000000001578))
            ThreePointArc((4.190000000000109, 0.9200000000001578), (4.149999999999999, 0.5000000000000709), (4.150000000000007, 0))
            Line((4.150000000000007, 0), (4.250000000000007, -0.09999999999999429))
            Line((4.250000000000007, -0.09999999999999429), (7.250000000000317, -0.09999999999999429))
            Line((7.250000000000317, -0.09999999999999429), (7.250000000000317, 0))
        make_face()
    revolve(axis=Axis((-3.77e-15, 65, 11.000000000000012), (0, -1, 0)), revolution_arc=359.64, mode=Mode.SUBTRACT)

    # Croquis22 → Cortar-Extruir6 (cut, up to next)
    with BuildSketch(Plane(origin=(0, 80, 0), x_dir=(1, 0, 0), z_dir=(0, 1, 0)), mode=Mode.PRIVATE) as cortar_extruir6_sk1:
        with Locations((0, 26.00000000000001)):
            Circle(CROQUIS22_R)
    cortar_extruir6_tool1 = extrude(cortar_extruir6_sk1.sketch, amount=-CORTAR_EXTRUIR6_REACH, mode=Mode.PRIVATE) & part.part
    add(cortar_extruir6_tool1.solids().sort_by_distance((0, 80, -26))[0], mode=Mode.SUBTRACT)

    # Redondeo3
    redondeo3_edges = [part.edges().sort_by_distance(p)[0] for p in [
        (23.075000000000003, 4.700000000000003, -13.250000000000005),
        (23.075000000000006, 4.700000000000003, -19.150000000000006),
    ]]
    fillet(redondeo3_edges, radius=REDONDEO3_R)

    # Croquis18 → Cortar-Extruir7 (cut)
    with BuildSketch(Plane(origin=(0, 3, 0), x_dir=(1, 0, 0), z_dir=(0, 1, 0))):
        with Locations((10, 16)):
            Rectangle(CROQUIS18_W, CROQUIS18_H)
    extrude(amount=-CORTAR_EXTRUIR7_DEPTH, mode=Mode.SUBTRACT)


solid = part.part
